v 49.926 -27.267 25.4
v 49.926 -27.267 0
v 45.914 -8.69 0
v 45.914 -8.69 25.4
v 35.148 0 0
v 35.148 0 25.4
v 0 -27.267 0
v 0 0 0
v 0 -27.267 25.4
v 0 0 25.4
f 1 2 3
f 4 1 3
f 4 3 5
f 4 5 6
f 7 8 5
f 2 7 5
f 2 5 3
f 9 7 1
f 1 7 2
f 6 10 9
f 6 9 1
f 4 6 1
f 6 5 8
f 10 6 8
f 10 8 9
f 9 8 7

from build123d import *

# Parameters (mm, degrees)
F1_DEPTH = 25.4
F2_SIZE  = 8.89


with BuildPart() as f1:
    # F0 (on Top) → F1 (new body)
    with BuildSketch(Plane.XY):
        Polygon((44.037506, 0), (0, 0), (0, -27.267408), (49.926244, -27.267408), align=None)
    extrude(amount=F1_DEPTH)

    # F2
    f2_edges = [f1.edges().sort_by_distance(p)[0] for p in [
        (44.037506, 0, 12.7),
    ]]
    chamfer(f2_edges, length=F2_SIZE)


solid = f1.part
